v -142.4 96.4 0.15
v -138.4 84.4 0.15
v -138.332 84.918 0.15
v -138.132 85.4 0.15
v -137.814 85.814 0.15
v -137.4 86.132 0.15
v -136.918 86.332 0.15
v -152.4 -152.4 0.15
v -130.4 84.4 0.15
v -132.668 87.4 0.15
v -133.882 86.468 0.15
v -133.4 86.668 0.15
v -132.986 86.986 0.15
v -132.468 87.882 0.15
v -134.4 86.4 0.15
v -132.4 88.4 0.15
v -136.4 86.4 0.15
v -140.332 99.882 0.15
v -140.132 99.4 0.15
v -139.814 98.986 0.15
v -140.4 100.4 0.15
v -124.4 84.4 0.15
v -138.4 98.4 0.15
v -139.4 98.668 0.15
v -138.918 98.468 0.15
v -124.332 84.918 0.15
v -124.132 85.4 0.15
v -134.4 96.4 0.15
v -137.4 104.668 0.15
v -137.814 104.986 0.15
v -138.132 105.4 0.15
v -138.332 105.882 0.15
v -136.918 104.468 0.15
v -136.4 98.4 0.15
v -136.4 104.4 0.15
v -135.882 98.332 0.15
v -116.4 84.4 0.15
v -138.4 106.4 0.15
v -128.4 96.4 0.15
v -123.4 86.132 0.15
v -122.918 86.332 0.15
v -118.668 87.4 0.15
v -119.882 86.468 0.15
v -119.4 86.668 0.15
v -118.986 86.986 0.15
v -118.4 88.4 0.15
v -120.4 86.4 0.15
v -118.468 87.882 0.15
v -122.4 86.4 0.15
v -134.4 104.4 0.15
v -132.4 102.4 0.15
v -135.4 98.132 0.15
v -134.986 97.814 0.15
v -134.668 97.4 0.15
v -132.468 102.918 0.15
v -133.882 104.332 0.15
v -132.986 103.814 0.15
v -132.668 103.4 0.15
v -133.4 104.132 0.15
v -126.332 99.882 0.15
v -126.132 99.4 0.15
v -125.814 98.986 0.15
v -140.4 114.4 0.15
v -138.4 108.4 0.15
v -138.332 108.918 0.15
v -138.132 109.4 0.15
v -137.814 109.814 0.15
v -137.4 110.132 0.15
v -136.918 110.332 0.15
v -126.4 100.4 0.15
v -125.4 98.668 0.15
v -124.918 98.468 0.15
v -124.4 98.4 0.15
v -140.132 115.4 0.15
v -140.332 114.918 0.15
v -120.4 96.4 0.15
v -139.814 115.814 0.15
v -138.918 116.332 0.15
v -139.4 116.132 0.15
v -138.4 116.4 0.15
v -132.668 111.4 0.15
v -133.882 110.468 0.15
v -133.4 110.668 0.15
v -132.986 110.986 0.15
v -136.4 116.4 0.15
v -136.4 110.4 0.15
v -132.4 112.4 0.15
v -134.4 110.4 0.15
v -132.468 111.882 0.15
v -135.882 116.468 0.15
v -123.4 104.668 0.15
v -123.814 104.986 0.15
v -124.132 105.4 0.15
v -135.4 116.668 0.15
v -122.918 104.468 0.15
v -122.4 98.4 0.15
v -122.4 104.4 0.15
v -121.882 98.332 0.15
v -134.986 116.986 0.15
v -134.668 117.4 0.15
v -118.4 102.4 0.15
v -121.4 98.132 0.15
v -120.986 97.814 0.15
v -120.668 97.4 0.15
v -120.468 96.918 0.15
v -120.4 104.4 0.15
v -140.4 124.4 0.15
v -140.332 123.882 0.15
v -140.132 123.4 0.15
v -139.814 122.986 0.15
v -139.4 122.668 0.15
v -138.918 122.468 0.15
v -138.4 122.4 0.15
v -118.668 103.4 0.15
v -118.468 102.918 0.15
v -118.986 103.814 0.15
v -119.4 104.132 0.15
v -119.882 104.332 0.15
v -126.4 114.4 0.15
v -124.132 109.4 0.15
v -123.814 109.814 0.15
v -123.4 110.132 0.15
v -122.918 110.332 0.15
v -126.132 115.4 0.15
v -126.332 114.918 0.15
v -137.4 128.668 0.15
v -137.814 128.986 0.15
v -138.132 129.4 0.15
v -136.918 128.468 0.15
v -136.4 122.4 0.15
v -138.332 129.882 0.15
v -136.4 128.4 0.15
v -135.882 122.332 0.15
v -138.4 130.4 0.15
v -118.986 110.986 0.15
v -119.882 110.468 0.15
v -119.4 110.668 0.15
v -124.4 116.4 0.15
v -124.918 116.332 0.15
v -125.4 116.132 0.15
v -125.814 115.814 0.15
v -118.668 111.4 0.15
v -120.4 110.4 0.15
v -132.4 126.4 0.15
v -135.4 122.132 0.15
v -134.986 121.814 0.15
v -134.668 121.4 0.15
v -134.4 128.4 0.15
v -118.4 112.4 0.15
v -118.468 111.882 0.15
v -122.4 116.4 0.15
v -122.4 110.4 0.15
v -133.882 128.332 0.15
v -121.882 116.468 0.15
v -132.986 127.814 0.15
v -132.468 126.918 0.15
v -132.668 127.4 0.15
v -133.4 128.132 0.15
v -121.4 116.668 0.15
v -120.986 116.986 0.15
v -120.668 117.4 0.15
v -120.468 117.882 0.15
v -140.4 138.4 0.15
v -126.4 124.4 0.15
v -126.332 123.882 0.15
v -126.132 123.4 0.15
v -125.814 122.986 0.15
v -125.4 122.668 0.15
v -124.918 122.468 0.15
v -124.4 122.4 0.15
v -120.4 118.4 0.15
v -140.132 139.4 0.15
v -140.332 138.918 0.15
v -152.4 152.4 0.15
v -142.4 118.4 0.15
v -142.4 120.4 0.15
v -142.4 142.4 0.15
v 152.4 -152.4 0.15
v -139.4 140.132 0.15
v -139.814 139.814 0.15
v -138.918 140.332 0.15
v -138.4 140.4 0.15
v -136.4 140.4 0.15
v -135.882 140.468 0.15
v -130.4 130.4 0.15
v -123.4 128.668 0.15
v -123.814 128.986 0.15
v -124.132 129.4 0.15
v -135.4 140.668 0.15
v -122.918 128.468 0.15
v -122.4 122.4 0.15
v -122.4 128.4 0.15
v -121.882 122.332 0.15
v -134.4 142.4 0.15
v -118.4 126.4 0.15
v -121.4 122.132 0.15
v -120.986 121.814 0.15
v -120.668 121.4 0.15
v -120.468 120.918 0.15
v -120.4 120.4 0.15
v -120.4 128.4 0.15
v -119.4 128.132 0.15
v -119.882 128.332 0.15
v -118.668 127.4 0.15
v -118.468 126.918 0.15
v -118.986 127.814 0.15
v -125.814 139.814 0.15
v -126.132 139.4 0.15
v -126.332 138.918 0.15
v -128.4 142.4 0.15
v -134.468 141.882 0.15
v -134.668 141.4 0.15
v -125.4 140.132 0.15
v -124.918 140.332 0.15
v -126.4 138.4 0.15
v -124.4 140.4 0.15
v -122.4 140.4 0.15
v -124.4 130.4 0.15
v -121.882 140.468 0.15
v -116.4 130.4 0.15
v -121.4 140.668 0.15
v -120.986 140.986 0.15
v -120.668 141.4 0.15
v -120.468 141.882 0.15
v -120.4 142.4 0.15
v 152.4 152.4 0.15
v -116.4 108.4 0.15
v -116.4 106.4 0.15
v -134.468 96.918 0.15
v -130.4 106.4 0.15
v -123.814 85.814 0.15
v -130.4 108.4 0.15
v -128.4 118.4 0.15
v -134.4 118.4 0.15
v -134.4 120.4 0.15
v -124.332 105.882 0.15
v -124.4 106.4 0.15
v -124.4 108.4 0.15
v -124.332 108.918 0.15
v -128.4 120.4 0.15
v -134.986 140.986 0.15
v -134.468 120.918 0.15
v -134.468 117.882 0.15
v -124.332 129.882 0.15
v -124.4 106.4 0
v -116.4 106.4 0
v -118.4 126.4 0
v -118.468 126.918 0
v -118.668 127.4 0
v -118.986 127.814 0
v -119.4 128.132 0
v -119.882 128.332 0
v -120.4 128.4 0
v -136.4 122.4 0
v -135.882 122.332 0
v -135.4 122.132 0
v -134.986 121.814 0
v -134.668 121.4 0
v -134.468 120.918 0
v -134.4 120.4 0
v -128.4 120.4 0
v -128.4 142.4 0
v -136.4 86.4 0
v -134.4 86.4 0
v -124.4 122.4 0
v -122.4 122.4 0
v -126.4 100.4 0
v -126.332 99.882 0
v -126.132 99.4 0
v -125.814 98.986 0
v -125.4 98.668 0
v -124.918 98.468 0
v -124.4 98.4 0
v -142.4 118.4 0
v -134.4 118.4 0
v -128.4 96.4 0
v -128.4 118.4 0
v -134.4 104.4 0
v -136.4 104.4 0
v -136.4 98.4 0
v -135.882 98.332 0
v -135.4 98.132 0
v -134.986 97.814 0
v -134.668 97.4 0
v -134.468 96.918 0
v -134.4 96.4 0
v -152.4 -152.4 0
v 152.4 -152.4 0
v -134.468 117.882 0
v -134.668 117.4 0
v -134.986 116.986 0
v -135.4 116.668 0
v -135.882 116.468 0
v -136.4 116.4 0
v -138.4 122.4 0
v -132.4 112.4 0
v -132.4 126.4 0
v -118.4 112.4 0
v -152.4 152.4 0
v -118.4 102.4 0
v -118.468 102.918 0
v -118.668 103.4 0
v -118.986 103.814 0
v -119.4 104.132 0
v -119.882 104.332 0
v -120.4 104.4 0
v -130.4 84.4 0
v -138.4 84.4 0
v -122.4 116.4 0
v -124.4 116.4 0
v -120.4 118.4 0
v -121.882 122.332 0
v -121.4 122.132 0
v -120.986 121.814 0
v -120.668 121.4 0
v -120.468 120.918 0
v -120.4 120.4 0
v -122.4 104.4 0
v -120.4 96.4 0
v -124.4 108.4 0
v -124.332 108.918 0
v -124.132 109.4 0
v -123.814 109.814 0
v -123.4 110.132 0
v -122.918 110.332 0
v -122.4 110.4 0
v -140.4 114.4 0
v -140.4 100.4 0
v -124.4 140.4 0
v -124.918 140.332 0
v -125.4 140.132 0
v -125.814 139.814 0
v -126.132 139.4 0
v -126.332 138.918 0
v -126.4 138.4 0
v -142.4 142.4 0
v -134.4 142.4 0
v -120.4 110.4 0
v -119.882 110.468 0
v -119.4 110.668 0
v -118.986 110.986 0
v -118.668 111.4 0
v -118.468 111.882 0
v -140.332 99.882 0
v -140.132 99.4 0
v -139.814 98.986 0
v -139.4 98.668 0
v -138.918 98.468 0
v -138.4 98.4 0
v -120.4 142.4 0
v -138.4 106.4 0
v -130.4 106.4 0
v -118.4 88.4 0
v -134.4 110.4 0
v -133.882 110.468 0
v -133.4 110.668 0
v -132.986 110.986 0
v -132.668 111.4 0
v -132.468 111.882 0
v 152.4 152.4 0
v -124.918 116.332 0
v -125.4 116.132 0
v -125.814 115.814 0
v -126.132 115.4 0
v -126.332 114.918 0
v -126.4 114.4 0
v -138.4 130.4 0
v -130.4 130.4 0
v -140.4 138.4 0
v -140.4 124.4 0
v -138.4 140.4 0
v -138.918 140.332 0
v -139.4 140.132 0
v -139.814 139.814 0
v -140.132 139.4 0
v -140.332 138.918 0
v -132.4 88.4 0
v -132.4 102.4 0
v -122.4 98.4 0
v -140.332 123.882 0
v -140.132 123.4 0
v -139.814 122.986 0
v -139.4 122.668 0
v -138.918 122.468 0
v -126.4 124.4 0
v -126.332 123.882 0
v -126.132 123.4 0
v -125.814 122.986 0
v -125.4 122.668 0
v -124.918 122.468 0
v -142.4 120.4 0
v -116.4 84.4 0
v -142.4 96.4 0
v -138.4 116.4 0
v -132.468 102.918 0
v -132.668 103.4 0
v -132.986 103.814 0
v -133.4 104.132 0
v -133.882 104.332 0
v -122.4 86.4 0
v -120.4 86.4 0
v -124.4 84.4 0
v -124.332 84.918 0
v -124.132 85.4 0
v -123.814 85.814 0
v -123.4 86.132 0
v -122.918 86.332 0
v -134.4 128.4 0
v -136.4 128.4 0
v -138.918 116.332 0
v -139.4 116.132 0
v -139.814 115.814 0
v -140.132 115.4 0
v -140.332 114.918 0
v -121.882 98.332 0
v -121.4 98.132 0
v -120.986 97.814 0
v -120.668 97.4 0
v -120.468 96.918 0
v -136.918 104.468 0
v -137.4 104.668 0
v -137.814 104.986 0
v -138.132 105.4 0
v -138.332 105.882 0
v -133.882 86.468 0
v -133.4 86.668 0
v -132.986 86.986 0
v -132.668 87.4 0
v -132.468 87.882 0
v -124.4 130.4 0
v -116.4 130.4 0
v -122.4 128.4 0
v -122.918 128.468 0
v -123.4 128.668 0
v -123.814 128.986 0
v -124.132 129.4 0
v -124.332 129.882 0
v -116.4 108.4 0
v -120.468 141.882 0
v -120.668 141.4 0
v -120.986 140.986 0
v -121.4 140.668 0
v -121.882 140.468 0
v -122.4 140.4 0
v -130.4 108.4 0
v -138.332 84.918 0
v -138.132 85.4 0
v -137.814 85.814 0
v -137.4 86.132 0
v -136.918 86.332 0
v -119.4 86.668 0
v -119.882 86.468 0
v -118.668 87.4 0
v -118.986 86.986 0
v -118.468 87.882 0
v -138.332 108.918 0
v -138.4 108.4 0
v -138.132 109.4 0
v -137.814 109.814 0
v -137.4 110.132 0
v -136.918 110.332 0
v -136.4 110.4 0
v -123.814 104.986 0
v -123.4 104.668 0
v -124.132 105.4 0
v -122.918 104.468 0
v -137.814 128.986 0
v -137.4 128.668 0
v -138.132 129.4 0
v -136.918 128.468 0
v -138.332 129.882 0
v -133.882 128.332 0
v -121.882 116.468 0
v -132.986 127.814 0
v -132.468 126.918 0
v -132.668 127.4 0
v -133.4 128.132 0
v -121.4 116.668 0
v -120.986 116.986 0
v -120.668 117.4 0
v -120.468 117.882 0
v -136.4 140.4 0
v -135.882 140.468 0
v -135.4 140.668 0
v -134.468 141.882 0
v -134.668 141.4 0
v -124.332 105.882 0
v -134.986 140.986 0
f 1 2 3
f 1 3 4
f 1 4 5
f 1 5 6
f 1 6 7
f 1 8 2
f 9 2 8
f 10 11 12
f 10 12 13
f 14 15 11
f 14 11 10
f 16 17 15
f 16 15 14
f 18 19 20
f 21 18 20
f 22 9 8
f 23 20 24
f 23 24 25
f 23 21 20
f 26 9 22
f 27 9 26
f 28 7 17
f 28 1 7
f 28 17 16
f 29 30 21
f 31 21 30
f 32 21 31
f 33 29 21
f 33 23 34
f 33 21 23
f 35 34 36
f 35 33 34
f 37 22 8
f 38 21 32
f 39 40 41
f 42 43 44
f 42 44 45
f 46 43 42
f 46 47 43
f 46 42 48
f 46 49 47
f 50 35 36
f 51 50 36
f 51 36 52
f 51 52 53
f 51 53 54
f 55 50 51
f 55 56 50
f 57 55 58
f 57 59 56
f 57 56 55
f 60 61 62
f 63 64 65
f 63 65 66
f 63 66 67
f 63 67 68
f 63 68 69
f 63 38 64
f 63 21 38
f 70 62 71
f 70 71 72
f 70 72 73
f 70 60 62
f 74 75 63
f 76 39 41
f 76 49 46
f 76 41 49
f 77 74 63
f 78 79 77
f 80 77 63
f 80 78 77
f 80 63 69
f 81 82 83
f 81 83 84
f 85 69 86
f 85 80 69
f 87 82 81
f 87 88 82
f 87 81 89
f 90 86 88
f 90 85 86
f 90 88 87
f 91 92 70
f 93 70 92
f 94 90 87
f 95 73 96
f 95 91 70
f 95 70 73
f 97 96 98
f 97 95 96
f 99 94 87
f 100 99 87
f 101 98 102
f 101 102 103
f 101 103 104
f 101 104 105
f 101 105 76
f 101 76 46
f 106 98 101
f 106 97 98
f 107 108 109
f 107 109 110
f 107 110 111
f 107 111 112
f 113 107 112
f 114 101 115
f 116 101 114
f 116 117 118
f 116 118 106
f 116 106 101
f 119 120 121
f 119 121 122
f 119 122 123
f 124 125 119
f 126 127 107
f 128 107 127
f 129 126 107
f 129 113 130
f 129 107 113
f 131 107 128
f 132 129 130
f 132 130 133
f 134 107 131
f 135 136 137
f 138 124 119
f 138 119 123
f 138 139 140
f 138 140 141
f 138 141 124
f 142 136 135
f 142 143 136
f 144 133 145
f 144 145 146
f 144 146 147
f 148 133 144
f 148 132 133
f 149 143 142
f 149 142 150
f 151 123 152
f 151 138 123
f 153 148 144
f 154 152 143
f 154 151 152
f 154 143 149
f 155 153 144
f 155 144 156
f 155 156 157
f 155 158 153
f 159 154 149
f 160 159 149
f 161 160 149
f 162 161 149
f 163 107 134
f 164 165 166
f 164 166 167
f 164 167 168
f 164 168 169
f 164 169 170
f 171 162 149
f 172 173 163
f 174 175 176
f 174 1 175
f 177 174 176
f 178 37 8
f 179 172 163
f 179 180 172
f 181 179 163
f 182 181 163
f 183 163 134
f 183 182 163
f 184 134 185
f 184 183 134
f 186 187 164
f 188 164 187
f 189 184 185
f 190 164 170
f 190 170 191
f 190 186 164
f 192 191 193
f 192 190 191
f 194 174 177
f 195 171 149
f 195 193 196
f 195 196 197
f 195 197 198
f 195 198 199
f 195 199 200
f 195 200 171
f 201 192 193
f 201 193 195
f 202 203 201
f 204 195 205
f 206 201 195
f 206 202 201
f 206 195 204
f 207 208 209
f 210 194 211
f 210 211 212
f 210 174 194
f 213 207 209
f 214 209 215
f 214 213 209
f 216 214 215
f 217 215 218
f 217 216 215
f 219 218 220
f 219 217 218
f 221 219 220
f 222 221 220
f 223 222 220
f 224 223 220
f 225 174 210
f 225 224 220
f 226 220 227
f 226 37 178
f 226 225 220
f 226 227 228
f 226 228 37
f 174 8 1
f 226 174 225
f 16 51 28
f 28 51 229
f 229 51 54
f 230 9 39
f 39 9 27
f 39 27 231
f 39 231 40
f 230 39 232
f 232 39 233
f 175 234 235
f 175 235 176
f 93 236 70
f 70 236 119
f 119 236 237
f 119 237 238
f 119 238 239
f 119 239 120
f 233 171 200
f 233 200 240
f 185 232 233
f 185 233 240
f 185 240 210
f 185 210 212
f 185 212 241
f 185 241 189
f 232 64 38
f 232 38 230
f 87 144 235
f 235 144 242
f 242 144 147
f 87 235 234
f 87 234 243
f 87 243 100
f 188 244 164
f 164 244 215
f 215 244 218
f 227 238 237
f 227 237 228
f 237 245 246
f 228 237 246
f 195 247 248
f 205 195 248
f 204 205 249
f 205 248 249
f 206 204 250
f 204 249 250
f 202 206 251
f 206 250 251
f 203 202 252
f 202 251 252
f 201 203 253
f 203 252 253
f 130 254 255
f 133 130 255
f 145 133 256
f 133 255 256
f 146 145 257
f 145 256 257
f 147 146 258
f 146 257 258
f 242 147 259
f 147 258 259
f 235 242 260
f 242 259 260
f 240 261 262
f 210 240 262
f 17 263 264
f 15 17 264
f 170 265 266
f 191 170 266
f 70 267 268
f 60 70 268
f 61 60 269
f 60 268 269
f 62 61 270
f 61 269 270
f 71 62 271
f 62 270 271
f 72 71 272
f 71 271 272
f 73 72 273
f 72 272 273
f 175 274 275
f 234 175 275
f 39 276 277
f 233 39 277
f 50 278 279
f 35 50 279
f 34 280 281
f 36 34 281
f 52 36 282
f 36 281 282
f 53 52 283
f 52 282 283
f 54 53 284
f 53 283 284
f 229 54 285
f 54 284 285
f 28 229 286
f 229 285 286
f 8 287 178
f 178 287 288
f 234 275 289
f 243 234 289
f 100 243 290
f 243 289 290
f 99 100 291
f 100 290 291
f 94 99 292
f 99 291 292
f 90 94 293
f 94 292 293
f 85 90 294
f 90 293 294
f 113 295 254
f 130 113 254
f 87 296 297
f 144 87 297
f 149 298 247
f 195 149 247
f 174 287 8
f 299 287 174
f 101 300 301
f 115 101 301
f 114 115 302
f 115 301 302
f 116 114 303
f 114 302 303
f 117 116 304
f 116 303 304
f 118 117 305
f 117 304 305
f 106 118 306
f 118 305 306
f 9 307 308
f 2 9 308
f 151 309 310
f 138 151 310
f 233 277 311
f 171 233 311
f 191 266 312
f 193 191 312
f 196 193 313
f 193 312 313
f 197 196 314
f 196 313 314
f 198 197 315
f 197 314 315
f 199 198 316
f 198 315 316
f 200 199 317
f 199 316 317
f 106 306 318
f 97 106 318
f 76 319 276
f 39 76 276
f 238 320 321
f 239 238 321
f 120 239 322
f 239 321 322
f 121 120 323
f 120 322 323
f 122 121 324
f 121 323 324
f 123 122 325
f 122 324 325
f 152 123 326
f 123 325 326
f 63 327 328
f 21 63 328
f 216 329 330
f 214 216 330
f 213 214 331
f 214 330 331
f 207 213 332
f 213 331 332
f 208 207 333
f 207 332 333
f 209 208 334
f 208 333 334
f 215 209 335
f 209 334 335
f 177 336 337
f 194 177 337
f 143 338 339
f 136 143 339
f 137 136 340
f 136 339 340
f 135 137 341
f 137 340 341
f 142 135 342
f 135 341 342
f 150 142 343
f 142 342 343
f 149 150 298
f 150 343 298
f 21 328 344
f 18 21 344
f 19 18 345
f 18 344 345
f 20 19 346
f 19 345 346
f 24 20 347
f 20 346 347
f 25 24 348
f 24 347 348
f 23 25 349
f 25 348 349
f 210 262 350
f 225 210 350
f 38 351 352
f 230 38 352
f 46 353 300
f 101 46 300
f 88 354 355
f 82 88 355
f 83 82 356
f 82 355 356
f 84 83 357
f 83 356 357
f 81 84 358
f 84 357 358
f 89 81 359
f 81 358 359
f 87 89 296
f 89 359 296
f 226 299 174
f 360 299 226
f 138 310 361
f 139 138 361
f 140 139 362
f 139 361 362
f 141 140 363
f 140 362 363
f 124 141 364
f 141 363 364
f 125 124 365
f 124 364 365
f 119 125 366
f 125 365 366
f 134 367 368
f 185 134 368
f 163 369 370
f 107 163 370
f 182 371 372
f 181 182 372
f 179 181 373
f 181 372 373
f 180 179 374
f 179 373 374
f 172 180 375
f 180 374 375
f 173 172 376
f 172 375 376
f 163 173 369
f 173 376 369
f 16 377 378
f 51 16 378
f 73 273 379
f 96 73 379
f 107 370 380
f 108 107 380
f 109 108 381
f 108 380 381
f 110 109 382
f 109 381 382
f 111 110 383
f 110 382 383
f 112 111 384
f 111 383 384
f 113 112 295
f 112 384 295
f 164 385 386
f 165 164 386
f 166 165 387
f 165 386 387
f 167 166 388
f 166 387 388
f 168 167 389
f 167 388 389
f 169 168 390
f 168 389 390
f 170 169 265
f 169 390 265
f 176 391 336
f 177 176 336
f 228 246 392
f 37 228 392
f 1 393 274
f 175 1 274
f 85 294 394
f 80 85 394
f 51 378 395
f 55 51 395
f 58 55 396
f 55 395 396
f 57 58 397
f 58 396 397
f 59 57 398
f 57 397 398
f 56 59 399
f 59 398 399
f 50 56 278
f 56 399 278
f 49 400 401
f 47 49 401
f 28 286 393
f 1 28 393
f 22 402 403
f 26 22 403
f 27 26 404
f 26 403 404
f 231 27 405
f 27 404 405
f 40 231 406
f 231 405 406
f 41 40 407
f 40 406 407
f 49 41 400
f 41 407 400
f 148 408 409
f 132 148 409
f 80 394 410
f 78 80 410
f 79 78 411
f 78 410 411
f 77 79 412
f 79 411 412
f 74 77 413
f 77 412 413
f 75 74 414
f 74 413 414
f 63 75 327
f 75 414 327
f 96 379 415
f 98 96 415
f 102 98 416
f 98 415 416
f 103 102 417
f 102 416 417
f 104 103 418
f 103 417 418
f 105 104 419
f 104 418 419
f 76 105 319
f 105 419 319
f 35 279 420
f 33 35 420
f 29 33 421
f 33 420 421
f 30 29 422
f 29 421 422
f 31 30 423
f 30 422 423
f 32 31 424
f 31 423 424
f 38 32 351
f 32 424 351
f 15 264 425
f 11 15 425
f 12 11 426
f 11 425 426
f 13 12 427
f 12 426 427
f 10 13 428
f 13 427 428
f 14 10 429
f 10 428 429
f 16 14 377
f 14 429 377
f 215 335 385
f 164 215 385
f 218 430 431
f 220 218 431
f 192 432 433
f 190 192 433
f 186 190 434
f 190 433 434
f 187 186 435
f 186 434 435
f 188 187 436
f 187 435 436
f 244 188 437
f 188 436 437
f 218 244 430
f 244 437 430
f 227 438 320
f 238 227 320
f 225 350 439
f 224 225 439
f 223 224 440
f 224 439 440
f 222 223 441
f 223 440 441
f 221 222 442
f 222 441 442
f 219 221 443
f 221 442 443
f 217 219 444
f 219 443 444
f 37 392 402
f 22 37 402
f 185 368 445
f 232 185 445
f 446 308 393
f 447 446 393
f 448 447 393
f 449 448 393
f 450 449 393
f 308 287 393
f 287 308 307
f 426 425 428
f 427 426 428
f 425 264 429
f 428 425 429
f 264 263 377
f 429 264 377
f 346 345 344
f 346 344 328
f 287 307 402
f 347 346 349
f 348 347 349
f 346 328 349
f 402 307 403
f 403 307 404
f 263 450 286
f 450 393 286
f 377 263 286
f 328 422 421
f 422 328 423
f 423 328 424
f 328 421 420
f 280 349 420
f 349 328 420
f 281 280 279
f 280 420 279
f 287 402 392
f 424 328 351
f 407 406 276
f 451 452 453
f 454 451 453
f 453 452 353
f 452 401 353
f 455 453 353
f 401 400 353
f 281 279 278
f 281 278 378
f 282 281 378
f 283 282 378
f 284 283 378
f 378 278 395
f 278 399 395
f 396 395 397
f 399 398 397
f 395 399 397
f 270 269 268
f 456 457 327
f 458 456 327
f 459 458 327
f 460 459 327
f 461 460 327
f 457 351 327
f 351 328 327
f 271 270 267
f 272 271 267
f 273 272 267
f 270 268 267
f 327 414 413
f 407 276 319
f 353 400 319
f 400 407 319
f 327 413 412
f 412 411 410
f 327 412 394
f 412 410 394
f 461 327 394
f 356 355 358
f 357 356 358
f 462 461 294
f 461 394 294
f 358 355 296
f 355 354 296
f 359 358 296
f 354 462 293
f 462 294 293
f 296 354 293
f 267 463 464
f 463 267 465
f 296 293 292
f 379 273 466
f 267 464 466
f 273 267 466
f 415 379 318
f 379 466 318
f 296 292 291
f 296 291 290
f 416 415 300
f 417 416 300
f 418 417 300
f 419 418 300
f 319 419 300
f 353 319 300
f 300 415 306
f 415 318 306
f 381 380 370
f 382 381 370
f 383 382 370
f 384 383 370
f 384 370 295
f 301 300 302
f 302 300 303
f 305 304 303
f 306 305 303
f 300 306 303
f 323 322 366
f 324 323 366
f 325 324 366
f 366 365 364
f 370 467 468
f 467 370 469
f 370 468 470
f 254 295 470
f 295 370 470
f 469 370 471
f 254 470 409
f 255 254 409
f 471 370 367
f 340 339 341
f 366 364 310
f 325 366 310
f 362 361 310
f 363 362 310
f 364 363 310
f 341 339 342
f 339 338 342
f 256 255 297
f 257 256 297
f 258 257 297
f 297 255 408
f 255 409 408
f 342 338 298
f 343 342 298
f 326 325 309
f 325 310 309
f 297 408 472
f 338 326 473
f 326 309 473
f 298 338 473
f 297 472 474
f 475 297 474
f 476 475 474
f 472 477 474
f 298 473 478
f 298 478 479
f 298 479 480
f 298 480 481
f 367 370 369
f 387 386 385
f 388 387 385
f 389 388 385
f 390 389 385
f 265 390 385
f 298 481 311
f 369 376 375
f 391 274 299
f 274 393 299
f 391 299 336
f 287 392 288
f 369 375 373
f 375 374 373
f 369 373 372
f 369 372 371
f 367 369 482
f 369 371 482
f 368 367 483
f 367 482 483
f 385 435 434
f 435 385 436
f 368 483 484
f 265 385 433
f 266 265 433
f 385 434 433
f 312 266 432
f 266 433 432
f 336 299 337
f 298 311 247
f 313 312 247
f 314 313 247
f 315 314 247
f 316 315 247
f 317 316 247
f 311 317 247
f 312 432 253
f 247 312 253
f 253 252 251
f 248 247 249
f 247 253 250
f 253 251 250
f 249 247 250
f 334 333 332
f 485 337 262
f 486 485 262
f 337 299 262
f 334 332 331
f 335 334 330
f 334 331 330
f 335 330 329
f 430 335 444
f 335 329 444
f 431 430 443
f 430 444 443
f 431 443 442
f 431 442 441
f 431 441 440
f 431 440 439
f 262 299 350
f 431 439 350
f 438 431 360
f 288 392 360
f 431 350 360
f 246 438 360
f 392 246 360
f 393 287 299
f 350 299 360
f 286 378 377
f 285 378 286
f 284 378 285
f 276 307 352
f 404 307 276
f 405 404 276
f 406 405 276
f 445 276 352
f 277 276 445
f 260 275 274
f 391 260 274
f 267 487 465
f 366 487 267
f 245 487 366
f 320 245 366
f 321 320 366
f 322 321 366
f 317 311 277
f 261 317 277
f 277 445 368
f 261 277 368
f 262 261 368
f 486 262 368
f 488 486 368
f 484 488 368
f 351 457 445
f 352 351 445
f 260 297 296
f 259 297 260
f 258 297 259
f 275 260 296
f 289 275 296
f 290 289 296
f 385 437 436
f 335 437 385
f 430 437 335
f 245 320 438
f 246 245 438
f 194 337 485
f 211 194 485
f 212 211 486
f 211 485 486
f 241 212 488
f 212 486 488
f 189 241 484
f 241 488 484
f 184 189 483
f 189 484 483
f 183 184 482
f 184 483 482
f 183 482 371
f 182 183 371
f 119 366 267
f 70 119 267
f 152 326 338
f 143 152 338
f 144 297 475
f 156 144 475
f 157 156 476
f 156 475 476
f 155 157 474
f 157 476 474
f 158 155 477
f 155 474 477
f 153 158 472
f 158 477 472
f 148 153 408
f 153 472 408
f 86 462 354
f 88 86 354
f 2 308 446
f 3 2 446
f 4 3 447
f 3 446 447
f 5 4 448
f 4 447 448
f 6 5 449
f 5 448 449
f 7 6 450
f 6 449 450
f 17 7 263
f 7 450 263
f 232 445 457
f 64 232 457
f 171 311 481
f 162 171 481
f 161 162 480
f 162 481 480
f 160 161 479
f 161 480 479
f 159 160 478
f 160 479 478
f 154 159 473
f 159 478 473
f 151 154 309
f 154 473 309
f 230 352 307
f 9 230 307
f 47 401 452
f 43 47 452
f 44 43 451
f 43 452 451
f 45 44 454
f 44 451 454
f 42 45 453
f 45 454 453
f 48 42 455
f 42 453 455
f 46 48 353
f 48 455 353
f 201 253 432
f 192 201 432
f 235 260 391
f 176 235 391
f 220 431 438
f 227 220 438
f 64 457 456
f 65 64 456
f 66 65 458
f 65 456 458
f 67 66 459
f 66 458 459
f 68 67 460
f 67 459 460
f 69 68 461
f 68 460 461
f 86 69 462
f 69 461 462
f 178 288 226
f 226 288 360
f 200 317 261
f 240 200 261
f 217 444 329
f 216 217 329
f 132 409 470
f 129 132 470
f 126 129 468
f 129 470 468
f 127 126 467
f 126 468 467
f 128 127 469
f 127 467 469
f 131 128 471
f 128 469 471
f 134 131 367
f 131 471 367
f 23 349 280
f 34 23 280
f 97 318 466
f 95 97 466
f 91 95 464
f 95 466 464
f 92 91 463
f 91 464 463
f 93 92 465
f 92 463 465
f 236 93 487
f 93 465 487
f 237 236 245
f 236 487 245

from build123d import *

# Parameters (mm, degrees)
F0_W     = 304.8
F0_H     = 304.8
F1_DEPTH = 0.15


with BuildPart() as f1:
    # F0 (on Top) → F1 (new body)
    with BuildSketch(Plane.XY):
        Rectangle(F0_W, F0_H)
        with BuildLine():
            Line((-132.4, 88.4), (-132.4, 95.4))
            Line((-132.4, 95.4), (-132.4, 102.4))
            ThreePointArc((-132.4, 102.4), (-132.985786, 103.814214), (-134.4, 104.4))
            Line((-134.4, 104.4), (-136.4, 104.4))
            ThreePointArc((-136.4, 104.4), (-137.814214, 104.985786), (-138.4, 106.4))
            Line((-138.4, 106.4), (-130.4, 106.4))
            Line((-130.4, 106.4), (-130.4, 95.4))
            Line((-130.4, 95.4), (-130.4, 84.4))
            Line((-130.4, 84.4), (-138.4, 84.4))
            ThreePointArc((-138.4, 84.4), (-137.814214, 85.814214), (-136.4, 86.4))
            Line((-136.4, 86.4), (-134.4, 86.4))
            ThreePointArc((-134.4, 86.4), (-132.985786, 86.985786), (-132.4, 88.4))
        make_face(mode=Mode.SUBTRACT)
        with BuildLine():
            Line((-140.4, 114.4), (-140.4, 107.4))
            Line((-140.4, 107.4), (-140.4, 100.4))
            ThreePointArc((-140.4, 100.4), (-139.814214, 98.985786), (-138.4, 98.4))
            Line((-138.4, 98.4), (-136.4, 98.4))
            ThreePointArc((-136.4, 98.4), (-134.985786, 97.814214), (-134.4, 96.4))
            Line((-134.4, 96.4), (-142.4, 96.4))
            Line((-142.4, 96.4), (-142.4, 107.4))
            Line((-142.4, 107.4), (-142.4, 118.4))
            Line((-142.4, 118.4), (-134.4, 118.4))
            ThreePointArc((-134.4, 118.4), (-134.985786, 116.985786), (-136.4, 116.4))
            Line((-136.4, 116.4), (-138.4, 116.4))
            ThreePointArc((-138.4, 116.4), (-139.814214, 115.814214), (-140.4, 114.4))
        make_face(mode=Mode.SUBTRACT)
        with BuildLine():
            Line((-118.4, 88.4), (-118.4, 95.4))
            Line((-118.4, 95.4), (-118.4, 102.4))
            ThreePointArc((-118.4, 102.4), (-118.985786, 103.814214), (-120.4, 104.4))
            Line((-120.4, 104.4), (-122.4, 104.4))
            ThreePointArc((-122.4, 104.4), (-123.814214, 104.985786), (-124.4, 106.4))
            Line((-124.4, 106.4), (-116.4, 106.4))
            Line((-116.4, 106.4), (-116.4, 95.4))
            Line((-116.4, 95.4), (-116.4, 84.4))
            Line((-116.4, 84.4), (-124.4, 84.4))
            ThreePointArc((-124.4, 84.4), (-123.814214, 85.814214), (-122.4, 86.4))
            Line((-122.4, 86.4), (-120.4, 86.4))
            ThreePointArc((-120.4, 86.4), (-118.985786, 86.985786), (-118.4, 88.4))
        make_face(mode=Mode.SUBTRACT)
        with BuildLine():
            Line((-126.4, 114.4), (-126.4, 107.4))
            Line((-126.4, 107.4), (-126.4, 100.4))
            ThreePointArc((-126.4, 100.4), (-125.814214, 98.985786), (-124.4, 98.4))
            Line((-124.4, 98.4), (-122.4, 98.4))
            ThreePointArc((-122.4, 98.4), (-120.985786, 97.814214), (-120.4, 96.4))
            Line((-120.4, 96.4), (-128.4, 96.4))
            Line((-128.4, 96.4), (-128.4, 107.4))
            Line((-128.4, 107.4), (-128.4, 118.4))
            Line((-128.4, 118.4), (-120.4, 118.4))
            ThreePointArc((-120.4, 118.4), (-120.985786, 116.985786), (-122.4, 116.4))
            Line((-122.4, 116.4), (-124.4, 116.4))
            ThreePointArc((-124.4, 116.4), (-125.814214, 115.814214), (-126.4, 114.4))
        make_face(mode=Mode.SUBTRACT)
        with BuildLine():
            Line((-130.4, 108.4), (-138.4, 108.4))
            ThreePointArc((-138.4, 108.4), (-137.814214, 109.814214), (-136.4, 110.4))
            Line((-136.4, 110.4), (-134.4, 110.4))
            ThreePointArc((-134.4, 110.4), (-132.985786, 110.985786), (-132.4, 112.4))
            Line((-132.4, 112.4), (-132.4, 119.4))
            Line((-132.4, 119.4), (-132.4, 126.4))
            ThreePointArc((-132.4, 126.4), (-132.985786, 127.814214), (-134.4, 128.4))
            Line((-134.4, 128.4), (-136.4, 128.4))
            ThreePointArc((-136.4, 128.4), (-137.814214, 128.985786), (-138.4, 130.4))
            Line((-138.4, 130.4), (-130.4, 130.4))
            Line((-130.4, 130.4), (-130.4, 119.4))
            Line((-130.4, 119.4), (-130.4, 108.4))
        make_face(mode=Mode.SUBTRACT)
        with BuildLine():
            Line((-142.4, 142.4), (-134.4, 142.4))
            ThreePointArc((-134.4, 142.4), (-134.985786, 140.985786), (-136.4, 140.4))
            Line((-136.4, 140.4), (-138.4, 140.4))
            ThreePointArc((-138.4, 140.4), (-139.814214, 139.814214), (-140.4, 138.4))
            Line((-140.4, 138.4), (-140.4, 131.4))
            Line((-140.4, 131.4), (-140.4, 124.4))
            ThreePointArc((-140.4, 124.4), (-139.814214, 122.985786), (-138.4, 122.4))
            Line((-138.4, 122.4), (-136.4, 122.4))
            ThreePointArc((-136.4, 122.4), (-134.985786, 121.814214), (-134.4, 120.4))
            Line((-134.4, 120.4), (-142.4, 120.4))
            Line((-142.4, 120.4), (-142.4, 131.4))
            Line((-142.4, 131.4), (-142.4, 142.4))
        make_face(mode=Mode.SUBTRACT)
        with BuildLine():
            Line((-118.4, 112.4), (-118.4, 119.4))
            Line((-118.4, 119.4), (-118.4, 126.4))
            ThreePointArc((-118.4, 126.4), (-118.985786, 127.814214), (-120.4, 128.4))
            Line((-120.4, 128.4), (-122.4, 128.4))
            ThreePointArc((-122.4, 128.4), (-123.814214, 128.985786), (-124.4, 130.4))
            Line((-124.4, 130.4), (-116.4, 130.4))
            Line((-116.4, 130.4), (-116.4, 119.4))
            Line((-116.4, 119.4), (-116.4, 108.4))
            Line((-116.4, 108.4), (-124.4, 108.4))
            ThreePointArc((-124.4, 108.4), (-123.814214, 109.814214), (-122.4, 110.4))
            Line((-122.4, 110.4), (-120.4, 110.4))
            ThreePointArc((-120.4, 110.4), (-118.985786, 110.985786), (-118.4, 112.4))
        make_face(mode=Mode.SUBTRACT)
        with BuildLine():
            Line((-126.4, 138.4), (-126.4, 131.4))
            Line((-126.4, 131.4), (-126.4, 124.4))
            ThreePointArc((-126.4, 124.4), (-125.814214, 122.985786), (-124.4, 122.4))
            Line((-124.4, 122.4), (-122.4, 122.4))
            ThreePointArc((-122.4, 122.4), (-120.985786, 121.814214), (-120.4, 120.4))
            Line((-120.4, 120.4), (-128.4, 120.4))
            Line((-128.4, 120.4), (-128.4, 131.4))
            Line((-128.4, 131.4), (-128.4, 142.4))
            Line((-128.4, 142.4), (-120.4, 142.4))
            ThreePointArc((-120.4, 142.4), (-120.985786, 140.985786), (-122.4, 140.4))
            Line((-122.4, 140.4), (-124.4, 140.4))
            ThreePointArc((-124.4, 140.4), (-125.814214, 139.814214), (-126.4, 138.4))
        make_face(mode=Mode.SUBTRACT)
    extrude(amount=F1_DEPTH)


solid = f1.part
